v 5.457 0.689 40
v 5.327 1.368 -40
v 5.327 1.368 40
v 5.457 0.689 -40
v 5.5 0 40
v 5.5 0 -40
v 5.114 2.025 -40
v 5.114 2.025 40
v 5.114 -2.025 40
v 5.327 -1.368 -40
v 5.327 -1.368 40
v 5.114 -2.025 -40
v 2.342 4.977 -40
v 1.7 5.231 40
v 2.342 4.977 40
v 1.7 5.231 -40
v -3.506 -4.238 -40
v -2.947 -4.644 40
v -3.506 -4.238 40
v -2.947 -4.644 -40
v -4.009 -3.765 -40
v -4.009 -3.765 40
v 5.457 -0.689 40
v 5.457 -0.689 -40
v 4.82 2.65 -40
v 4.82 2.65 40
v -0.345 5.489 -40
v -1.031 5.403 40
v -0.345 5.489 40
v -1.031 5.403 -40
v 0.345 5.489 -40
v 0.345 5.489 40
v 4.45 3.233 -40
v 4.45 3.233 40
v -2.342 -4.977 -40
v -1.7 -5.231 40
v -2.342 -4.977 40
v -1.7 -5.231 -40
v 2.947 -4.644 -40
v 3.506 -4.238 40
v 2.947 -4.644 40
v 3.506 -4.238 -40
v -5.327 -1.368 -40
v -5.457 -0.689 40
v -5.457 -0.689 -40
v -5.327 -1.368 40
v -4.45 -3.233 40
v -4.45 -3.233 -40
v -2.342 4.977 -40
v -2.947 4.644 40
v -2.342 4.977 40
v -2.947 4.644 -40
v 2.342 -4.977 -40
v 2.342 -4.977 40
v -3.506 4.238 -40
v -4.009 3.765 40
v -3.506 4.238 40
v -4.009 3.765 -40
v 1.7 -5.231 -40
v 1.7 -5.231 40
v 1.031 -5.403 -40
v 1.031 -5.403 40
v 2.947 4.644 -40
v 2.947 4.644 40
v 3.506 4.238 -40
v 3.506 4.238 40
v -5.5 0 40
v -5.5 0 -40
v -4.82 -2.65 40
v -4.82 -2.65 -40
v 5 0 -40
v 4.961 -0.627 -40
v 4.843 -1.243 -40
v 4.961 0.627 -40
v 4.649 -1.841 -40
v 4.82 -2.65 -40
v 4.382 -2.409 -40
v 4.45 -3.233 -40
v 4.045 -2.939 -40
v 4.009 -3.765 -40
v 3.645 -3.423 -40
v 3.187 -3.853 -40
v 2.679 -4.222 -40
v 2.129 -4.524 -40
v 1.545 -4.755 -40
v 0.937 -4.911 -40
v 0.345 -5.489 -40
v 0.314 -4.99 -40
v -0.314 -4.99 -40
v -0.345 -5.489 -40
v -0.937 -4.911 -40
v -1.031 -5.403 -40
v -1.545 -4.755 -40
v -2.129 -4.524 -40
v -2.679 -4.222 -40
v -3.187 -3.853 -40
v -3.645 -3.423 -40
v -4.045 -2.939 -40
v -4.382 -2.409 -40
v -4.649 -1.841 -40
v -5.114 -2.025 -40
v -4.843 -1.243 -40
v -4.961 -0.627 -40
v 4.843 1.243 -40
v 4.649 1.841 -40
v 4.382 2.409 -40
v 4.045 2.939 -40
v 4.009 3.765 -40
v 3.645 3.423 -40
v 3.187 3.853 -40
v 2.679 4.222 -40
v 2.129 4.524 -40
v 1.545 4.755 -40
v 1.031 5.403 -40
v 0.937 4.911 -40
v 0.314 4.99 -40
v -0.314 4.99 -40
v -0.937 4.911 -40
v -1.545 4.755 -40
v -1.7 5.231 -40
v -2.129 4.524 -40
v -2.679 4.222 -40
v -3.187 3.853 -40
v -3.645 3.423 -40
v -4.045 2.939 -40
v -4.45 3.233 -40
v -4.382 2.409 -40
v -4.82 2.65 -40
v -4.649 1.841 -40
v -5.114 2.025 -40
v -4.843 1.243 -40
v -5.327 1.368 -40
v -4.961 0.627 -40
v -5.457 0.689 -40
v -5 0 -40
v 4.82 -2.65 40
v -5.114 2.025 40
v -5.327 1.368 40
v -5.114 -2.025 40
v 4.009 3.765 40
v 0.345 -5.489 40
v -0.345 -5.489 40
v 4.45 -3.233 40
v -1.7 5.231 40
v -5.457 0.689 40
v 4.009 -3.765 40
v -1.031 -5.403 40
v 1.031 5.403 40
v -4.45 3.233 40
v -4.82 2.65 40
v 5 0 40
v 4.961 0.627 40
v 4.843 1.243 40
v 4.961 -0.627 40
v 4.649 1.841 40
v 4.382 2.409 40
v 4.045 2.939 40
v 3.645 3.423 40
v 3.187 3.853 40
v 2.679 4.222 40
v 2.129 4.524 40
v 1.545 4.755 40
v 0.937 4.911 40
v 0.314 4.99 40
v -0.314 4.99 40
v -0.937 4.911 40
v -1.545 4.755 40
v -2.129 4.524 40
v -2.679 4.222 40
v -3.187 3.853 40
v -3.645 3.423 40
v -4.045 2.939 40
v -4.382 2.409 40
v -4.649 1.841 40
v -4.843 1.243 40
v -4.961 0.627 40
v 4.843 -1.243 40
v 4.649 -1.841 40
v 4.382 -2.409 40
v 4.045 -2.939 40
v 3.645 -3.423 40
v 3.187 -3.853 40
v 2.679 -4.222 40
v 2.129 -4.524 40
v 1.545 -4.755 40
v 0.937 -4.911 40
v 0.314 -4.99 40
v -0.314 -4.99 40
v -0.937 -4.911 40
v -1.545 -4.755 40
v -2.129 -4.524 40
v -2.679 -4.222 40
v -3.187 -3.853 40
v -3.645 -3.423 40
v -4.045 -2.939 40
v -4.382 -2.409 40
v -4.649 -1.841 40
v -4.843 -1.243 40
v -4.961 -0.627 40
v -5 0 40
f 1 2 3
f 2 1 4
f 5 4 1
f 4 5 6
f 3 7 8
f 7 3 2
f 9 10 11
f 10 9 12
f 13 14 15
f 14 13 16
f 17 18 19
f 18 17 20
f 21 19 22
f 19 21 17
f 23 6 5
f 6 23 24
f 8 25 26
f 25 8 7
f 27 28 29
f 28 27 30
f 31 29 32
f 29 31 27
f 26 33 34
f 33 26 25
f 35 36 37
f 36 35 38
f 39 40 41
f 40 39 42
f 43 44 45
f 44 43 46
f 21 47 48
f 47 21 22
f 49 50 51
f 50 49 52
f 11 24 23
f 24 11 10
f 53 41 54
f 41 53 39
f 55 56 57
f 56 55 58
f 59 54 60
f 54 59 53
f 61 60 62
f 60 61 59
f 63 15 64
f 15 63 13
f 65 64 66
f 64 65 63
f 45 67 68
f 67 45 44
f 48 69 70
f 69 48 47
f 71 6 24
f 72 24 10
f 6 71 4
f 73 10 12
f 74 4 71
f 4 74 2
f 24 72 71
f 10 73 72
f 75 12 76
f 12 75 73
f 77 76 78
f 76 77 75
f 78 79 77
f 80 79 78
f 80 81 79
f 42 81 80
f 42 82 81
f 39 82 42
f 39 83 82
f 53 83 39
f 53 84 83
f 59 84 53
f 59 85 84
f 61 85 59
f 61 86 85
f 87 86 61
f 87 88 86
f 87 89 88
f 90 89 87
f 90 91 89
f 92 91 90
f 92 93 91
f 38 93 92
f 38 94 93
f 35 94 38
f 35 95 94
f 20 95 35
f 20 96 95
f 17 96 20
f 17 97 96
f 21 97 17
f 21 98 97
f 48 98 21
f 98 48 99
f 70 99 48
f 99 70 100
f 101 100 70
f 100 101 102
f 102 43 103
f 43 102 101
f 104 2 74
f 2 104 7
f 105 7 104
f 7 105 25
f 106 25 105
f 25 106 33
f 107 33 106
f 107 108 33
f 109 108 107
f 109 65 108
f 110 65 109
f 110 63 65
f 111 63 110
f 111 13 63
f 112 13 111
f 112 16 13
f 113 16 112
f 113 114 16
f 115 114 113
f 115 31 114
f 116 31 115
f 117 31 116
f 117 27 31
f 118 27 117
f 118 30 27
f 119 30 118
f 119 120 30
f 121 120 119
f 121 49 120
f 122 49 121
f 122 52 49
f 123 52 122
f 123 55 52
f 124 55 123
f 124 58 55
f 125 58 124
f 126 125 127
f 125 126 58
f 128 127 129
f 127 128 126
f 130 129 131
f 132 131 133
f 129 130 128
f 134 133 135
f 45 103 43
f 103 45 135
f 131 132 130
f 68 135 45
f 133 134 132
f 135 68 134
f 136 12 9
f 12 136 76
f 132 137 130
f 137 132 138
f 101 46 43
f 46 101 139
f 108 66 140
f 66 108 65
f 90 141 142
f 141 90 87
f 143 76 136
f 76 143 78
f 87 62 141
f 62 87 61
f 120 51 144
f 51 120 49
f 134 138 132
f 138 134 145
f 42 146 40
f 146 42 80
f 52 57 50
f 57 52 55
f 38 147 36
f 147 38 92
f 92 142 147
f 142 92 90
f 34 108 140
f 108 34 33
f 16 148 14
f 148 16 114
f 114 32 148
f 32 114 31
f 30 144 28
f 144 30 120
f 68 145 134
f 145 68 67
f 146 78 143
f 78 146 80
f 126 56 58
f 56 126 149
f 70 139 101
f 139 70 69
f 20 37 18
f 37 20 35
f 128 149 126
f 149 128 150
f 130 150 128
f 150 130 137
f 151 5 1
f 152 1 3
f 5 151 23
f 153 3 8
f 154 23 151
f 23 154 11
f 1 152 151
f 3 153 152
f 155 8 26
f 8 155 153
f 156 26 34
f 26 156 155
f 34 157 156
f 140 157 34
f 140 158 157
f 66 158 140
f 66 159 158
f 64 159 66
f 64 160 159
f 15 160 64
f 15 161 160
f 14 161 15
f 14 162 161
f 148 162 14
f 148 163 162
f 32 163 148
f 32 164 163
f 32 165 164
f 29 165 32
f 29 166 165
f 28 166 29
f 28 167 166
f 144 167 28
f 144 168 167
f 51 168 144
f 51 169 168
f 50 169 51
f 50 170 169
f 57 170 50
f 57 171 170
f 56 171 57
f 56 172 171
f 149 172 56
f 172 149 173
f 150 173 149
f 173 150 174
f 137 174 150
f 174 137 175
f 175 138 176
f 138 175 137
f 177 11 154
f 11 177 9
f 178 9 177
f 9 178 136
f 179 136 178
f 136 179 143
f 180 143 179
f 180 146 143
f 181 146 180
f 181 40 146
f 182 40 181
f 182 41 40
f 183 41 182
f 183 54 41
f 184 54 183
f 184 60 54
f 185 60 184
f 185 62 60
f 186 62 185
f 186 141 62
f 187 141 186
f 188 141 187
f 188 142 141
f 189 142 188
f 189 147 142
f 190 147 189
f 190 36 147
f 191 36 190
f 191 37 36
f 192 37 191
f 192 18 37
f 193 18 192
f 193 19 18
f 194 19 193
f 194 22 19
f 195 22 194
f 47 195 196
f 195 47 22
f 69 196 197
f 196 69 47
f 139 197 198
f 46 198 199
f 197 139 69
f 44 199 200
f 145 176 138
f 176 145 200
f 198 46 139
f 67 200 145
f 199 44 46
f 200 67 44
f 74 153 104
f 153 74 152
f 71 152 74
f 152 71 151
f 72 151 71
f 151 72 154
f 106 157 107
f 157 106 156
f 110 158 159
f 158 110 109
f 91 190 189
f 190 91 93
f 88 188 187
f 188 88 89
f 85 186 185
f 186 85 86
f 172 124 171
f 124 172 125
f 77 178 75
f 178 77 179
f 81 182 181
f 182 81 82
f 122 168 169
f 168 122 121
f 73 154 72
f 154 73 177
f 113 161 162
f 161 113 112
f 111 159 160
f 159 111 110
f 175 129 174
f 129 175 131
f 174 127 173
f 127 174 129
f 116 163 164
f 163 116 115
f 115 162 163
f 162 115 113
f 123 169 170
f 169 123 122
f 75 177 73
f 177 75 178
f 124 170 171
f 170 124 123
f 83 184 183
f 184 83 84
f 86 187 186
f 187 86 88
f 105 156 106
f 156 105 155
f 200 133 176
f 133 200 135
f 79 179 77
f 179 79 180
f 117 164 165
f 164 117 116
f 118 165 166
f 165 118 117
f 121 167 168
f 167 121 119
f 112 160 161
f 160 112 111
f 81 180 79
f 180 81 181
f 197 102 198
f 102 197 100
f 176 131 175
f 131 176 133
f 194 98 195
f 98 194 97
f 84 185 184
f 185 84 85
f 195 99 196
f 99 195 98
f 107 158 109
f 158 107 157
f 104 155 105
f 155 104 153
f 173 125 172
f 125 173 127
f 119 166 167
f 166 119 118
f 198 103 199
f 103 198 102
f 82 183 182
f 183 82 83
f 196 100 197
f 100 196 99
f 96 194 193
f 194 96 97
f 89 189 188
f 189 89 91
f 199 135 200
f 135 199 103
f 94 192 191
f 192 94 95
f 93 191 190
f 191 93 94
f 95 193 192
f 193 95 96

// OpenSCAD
$fn = 50;


difference() {
	union() {
		translate(v = [0, 0, -40.0000000000]) {
			cylinder(h = 80, r = 5.5000000000);
		}
	}
	union() {
		translate(v = [0, 0, -100.0000000000]) {
			cylinder(h = 200, r = 5.0000000000);
		}
	}
}
